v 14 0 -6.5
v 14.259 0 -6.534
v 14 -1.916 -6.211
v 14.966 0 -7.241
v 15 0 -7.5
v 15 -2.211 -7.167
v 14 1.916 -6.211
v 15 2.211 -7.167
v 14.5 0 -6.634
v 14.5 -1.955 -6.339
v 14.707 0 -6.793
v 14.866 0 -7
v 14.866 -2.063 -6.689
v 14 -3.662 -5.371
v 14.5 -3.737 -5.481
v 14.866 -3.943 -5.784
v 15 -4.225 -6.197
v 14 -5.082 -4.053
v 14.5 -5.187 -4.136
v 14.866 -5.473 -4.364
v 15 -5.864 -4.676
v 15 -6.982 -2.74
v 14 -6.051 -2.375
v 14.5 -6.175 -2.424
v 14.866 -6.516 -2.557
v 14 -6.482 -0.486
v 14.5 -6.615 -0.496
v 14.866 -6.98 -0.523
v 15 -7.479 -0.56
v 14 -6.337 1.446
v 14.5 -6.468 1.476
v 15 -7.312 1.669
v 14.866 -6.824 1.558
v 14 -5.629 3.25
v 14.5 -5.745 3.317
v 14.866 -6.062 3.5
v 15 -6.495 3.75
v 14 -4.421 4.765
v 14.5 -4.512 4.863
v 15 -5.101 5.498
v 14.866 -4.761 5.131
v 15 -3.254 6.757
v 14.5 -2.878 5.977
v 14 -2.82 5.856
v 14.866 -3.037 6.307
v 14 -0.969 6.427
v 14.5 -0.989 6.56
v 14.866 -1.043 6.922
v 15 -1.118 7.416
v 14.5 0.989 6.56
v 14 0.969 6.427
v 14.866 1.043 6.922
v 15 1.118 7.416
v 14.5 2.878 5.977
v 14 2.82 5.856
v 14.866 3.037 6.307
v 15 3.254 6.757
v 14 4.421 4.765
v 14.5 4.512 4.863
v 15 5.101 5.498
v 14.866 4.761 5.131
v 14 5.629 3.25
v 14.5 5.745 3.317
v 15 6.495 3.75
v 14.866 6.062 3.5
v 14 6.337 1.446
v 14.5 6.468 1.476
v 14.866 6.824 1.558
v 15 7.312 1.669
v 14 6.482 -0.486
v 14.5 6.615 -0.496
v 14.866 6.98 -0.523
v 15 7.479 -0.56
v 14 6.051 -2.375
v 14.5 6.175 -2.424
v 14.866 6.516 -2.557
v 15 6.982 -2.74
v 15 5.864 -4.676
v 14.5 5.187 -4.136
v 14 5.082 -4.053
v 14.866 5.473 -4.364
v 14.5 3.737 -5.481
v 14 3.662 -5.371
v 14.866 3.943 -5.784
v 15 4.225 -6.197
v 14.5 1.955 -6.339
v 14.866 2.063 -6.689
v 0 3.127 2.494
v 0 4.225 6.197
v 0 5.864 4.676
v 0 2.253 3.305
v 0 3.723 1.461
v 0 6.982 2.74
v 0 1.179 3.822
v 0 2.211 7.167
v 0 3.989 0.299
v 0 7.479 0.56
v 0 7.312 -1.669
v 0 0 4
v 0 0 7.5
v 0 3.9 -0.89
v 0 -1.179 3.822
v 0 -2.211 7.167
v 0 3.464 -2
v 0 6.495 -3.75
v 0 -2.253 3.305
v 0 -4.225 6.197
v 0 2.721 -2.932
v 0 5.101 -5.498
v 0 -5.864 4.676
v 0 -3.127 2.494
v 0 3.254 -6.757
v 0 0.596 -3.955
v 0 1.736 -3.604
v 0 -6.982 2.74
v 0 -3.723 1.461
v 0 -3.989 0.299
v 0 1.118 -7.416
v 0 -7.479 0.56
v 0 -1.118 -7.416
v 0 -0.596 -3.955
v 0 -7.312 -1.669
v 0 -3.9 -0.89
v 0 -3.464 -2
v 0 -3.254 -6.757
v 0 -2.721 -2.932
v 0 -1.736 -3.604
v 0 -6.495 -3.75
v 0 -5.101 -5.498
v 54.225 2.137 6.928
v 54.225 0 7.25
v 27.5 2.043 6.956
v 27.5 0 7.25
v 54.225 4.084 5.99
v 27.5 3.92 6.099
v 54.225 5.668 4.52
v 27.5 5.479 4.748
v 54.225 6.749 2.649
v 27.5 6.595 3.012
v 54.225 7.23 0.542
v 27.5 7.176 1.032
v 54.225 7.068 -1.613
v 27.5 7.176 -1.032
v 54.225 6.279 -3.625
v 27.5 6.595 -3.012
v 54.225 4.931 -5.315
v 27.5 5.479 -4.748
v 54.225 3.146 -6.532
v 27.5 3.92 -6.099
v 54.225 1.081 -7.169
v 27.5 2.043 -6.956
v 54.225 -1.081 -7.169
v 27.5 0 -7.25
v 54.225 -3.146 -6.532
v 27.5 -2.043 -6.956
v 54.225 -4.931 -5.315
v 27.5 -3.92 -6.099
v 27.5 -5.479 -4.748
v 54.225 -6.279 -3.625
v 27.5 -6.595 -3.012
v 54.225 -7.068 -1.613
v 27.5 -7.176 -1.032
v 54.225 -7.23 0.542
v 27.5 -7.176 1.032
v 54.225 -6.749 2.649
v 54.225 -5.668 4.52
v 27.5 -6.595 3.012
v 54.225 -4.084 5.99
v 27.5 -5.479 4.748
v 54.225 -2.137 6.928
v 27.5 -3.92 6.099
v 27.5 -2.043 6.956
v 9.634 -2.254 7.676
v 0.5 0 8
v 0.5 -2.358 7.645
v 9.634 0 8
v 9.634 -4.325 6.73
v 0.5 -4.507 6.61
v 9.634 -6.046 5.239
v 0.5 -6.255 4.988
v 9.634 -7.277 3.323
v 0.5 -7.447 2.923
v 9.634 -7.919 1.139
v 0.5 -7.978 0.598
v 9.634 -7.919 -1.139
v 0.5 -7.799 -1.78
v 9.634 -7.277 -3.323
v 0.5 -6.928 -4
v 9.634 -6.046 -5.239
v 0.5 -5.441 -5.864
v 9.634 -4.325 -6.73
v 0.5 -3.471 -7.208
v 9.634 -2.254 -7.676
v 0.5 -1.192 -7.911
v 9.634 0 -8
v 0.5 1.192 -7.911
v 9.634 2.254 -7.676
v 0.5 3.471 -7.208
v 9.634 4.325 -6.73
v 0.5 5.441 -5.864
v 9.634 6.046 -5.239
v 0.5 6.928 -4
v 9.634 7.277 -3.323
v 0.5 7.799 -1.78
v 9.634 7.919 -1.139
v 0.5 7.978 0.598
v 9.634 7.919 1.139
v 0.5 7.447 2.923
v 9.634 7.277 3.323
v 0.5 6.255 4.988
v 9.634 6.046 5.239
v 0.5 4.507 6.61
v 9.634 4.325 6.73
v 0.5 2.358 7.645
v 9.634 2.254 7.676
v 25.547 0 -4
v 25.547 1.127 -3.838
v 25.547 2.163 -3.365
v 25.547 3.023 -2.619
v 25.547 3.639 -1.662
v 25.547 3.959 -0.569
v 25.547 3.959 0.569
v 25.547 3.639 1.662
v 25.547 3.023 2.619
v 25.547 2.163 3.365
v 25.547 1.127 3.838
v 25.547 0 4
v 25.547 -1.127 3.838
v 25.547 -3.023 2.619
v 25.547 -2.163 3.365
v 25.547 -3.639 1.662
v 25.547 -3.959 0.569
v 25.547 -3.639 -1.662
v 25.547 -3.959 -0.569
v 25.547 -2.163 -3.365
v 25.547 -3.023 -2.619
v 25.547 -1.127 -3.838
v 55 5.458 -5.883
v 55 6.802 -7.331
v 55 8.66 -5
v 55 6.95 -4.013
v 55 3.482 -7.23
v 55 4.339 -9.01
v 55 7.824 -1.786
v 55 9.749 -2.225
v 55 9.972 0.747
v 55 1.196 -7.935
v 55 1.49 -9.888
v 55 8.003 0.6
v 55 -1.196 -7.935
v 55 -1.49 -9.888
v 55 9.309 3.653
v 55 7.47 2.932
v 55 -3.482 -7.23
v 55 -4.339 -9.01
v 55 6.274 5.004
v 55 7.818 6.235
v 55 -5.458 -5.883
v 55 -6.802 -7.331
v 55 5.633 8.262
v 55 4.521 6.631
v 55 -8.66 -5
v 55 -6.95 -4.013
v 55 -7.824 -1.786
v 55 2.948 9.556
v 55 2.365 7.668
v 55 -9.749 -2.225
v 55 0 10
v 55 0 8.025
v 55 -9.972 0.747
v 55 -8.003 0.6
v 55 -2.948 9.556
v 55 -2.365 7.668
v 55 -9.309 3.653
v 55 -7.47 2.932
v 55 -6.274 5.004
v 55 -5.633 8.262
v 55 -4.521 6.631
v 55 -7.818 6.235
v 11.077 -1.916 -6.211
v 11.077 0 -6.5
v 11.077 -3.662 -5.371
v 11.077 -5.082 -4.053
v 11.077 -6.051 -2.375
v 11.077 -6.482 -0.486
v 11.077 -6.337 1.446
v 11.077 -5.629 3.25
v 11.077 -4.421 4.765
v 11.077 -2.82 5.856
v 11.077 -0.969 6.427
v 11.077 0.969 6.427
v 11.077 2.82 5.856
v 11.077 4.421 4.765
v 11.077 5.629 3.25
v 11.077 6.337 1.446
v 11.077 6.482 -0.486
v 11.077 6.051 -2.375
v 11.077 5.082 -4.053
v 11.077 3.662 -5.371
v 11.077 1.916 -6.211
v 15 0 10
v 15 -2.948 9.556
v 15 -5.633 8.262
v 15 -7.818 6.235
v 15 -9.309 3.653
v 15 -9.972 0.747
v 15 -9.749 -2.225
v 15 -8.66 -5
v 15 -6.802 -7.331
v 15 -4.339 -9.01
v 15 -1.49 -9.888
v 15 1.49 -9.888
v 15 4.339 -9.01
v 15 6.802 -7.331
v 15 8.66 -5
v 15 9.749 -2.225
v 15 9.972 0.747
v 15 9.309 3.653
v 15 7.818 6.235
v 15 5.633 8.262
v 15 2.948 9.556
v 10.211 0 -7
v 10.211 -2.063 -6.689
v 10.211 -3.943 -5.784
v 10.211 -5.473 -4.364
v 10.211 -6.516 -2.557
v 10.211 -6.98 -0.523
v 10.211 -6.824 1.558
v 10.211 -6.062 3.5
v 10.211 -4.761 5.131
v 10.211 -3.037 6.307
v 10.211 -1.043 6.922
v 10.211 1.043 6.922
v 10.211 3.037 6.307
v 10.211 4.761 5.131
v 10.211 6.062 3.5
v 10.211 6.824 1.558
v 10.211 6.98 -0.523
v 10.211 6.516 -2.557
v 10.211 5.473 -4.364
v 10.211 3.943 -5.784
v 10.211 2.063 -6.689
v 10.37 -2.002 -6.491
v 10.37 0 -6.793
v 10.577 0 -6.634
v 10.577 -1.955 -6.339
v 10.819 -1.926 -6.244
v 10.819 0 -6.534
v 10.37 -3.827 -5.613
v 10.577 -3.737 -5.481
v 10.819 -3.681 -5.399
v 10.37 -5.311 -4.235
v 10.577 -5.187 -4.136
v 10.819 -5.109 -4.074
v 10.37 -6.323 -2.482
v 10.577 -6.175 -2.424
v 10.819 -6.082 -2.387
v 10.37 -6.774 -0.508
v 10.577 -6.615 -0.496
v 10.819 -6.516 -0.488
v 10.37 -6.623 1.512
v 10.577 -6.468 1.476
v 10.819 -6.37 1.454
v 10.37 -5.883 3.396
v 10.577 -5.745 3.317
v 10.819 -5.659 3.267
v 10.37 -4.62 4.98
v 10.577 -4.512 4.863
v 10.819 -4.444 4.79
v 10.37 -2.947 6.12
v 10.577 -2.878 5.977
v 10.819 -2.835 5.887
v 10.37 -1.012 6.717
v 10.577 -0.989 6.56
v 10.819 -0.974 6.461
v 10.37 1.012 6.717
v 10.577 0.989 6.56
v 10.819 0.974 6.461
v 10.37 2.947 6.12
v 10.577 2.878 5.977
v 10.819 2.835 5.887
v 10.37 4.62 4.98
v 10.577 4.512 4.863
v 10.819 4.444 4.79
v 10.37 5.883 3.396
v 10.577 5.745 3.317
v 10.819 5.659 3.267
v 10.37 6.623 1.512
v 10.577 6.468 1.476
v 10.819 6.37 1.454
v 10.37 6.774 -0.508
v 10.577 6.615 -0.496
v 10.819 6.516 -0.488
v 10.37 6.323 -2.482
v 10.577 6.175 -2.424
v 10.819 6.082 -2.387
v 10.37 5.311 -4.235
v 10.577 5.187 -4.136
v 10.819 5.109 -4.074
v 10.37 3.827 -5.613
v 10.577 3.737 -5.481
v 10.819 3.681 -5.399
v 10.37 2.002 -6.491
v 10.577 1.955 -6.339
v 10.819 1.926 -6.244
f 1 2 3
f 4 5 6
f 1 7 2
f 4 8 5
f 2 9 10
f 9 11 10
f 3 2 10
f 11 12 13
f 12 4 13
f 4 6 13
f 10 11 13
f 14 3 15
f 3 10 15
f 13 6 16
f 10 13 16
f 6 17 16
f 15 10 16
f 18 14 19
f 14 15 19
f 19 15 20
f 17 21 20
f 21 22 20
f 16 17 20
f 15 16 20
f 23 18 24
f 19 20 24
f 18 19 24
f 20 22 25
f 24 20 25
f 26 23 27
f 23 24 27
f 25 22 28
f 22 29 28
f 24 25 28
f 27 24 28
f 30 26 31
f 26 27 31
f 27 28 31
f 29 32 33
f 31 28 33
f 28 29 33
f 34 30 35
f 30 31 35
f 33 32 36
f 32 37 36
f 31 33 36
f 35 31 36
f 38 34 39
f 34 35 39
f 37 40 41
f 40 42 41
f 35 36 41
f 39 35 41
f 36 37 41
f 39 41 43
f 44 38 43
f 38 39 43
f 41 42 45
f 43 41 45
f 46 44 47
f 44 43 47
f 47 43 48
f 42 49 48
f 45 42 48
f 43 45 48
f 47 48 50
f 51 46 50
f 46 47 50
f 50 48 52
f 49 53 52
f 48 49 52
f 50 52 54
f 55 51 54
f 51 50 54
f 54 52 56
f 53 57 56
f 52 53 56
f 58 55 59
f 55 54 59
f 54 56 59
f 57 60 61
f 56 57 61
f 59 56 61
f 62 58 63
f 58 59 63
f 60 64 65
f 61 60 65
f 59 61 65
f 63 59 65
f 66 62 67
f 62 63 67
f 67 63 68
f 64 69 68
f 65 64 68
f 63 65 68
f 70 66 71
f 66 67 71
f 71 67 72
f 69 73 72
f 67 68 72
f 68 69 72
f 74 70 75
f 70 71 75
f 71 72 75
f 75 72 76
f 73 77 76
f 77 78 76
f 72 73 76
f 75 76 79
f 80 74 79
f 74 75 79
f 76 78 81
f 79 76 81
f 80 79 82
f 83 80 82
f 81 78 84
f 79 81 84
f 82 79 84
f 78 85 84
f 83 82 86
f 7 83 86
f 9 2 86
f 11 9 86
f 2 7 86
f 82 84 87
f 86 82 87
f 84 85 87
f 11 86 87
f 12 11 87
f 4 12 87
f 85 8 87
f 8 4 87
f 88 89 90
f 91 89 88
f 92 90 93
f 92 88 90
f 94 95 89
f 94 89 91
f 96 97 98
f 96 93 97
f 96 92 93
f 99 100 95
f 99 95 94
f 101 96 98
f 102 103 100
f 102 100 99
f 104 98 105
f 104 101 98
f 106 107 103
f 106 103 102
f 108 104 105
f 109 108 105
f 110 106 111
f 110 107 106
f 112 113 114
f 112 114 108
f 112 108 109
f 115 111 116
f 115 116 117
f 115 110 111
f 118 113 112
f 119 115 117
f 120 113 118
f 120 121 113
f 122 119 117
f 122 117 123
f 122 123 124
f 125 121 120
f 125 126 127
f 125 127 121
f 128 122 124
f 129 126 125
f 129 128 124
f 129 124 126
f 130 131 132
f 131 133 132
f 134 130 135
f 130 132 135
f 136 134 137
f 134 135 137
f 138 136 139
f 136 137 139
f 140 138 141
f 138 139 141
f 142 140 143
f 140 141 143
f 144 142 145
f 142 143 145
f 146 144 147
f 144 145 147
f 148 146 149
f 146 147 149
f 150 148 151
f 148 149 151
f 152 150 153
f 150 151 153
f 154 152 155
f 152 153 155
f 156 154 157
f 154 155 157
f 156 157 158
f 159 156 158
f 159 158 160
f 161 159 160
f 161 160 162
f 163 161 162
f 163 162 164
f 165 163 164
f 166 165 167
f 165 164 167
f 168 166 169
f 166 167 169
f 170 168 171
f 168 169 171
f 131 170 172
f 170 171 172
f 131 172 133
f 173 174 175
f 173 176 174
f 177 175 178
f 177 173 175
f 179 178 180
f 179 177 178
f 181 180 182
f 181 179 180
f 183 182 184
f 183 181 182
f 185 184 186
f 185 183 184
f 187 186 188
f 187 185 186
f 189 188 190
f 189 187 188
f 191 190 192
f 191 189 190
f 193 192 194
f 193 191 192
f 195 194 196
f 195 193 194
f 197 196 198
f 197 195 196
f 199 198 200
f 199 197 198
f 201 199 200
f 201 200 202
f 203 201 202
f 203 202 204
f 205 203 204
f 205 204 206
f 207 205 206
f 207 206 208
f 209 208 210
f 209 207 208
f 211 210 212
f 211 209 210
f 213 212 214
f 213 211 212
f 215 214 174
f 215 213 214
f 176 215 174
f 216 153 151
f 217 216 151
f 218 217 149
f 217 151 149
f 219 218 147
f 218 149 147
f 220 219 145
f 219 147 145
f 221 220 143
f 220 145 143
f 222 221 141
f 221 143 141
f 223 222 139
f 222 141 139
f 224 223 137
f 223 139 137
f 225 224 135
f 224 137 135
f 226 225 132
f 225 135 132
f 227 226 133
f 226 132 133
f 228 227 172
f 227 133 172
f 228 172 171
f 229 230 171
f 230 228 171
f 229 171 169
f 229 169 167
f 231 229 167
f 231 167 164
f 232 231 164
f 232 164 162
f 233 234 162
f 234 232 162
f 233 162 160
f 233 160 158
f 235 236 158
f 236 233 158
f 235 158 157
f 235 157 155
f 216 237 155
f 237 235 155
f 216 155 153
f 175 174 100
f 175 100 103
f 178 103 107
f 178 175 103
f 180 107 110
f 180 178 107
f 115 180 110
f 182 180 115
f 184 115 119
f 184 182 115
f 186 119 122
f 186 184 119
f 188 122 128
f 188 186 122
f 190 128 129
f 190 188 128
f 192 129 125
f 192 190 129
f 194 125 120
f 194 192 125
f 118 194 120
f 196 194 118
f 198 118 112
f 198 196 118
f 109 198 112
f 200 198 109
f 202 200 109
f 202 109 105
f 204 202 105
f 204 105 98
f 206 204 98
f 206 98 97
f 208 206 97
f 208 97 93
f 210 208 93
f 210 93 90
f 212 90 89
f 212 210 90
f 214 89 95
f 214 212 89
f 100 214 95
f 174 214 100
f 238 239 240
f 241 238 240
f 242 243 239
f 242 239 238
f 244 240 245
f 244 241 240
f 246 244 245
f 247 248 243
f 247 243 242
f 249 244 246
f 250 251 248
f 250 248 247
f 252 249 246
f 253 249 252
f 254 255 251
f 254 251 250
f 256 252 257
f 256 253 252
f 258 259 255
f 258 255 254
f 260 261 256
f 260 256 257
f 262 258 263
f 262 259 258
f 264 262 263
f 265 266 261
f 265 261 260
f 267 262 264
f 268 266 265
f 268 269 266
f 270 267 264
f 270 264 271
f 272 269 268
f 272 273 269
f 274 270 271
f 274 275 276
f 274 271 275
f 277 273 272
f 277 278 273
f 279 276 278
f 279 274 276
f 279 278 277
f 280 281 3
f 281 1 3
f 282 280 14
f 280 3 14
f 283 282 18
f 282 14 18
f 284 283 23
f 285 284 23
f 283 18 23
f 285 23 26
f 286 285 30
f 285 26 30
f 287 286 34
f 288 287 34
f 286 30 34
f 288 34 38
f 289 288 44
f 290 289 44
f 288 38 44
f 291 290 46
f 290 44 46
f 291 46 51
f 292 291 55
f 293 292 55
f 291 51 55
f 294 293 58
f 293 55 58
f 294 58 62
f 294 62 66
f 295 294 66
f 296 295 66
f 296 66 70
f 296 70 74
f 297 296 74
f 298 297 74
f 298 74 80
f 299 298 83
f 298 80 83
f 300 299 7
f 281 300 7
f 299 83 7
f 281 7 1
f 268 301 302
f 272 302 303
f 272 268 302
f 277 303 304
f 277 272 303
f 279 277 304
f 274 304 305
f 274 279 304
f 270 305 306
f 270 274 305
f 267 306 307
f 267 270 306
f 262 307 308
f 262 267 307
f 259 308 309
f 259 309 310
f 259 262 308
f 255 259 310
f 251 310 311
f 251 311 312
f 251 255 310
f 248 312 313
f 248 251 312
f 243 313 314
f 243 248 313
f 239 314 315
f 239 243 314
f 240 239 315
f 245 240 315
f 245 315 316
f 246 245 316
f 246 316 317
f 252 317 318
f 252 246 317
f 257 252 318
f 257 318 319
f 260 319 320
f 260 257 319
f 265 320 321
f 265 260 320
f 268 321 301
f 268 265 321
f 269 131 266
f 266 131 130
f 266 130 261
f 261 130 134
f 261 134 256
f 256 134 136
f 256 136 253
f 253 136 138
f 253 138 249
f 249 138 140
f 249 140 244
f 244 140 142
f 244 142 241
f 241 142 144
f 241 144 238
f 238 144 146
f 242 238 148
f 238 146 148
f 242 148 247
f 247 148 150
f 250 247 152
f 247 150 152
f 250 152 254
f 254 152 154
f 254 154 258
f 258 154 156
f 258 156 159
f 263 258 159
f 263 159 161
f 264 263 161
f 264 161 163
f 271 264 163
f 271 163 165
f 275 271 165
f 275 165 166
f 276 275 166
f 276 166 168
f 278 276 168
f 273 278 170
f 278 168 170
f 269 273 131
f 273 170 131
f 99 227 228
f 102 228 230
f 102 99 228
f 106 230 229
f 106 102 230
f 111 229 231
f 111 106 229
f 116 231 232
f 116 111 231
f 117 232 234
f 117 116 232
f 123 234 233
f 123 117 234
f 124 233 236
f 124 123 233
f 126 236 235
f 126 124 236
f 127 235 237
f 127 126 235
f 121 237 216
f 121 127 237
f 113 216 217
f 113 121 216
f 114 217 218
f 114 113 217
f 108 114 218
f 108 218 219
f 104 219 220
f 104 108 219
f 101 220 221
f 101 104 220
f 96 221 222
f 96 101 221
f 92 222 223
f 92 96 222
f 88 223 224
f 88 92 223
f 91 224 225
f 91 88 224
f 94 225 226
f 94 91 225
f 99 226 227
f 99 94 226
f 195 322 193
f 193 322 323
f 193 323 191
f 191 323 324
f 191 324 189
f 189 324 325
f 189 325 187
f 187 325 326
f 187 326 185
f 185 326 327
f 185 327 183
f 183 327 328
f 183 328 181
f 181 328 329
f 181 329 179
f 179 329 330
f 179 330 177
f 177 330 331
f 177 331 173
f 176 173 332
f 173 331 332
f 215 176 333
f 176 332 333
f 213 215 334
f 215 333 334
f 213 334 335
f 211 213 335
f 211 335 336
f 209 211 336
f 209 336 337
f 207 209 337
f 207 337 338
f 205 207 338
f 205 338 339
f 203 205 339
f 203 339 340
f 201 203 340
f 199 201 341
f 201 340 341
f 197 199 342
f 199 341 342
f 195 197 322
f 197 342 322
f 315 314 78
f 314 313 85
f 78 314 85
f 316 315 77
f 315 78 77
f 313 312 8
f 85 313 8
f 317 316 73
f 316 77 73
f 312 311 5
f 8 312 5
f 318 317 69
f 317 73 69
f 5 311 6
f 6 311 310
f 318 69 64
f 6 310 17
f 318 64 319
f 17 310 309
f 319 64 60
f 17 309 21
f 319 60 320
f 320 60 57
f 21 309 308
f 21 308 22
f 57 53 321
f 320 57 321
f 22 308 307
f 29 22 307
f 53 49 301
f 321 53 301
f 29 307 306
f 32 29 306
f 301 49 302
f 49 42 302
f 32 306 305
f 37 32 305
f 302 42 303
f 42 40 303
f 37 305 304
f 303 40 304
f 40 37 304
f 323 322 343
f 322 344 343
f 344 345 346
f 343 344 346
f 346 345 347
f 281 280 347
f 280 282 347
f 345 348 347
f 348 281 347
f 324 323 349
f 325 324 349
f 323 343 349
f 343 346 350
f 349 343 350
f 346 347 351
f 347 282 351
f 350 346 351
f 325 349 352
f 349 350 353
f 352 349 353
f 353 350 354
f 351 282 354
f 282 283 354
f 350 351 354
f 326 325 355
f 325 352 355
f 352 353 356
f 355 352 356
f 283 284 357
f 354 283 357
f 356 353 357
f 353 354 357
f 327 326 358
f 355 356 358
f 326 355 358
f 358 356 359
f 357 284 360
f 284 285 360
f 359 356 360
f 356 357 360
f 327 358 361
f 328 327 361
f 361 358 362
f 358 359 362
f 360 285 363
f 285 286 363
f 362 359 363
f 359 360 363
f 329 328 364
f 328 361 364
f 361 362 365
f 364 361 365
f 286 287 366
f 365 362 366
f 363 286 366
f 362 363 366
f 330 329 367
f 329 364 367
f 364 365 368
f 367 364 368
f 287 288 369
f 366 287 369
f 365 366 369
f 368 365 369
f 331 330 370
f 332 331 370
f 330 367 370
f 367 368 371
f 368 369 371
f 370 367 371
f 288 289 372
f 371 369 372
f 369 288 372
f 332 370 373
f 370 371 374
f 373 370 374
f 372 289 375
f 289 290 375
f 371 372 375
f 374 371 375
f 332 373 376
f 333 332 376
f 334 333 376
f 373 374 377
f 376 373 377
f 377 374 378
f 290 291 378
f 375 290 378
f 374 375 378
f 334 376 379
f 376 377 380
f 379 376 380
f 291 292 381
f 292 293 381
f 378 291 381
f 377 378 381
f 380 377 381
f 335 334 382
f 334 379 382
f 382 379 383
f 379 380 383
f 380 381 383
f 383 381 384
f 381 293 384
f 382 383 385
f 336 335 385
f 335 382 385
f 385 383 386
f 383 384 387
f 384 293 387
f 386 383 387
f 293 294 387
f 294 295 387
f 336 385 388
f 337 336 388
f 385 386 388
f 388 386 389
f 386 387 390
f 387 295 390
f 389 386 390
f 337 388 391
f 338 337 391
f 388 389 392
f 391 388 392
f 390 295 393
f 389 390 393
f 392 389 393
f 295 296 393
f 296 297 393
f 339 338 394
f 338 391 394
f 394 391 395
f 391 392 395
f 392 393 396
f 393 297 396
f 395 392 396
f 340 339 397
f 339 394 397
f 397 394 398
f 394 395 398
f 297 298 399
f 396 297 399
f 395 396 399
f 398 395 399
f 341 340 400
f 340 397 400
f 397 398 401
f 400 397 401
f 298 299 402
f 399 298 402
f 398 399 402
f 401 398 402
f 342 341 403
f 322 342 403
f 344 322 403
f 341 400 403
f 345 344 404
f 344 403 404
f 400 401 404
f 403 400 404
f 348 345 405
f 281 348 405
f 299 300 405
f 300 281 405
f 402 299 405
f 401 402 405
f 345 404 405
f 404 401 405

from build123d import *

# Parameters (mm, degrees)
M16X1_5_GEWINDEBOHRUNG1_D           = 14.5
M16X1_5_GEWINDEBOHRUNG1_DEPTH       = 27.5
M16X1_5_GEWINDEBOHRUNG1_CSINK_D     = 16.05
M16X1_5_GEWINDEBOHRUNG1_CSINK_ANGLE = 90
M16X1_5_GEWINDEBOHRUNG1_TIP         = 4.356239488
FASE1_SIZE                          = 0.5


with BuildPart() as part:
    # Skizze1 → Rotation1 (revolve)
    with BuildSketch(Plane.XY, mode=Mode.PRIVATE) as rotation1_sk:
        Polygon((55, 4), (0, 4), (0, 8), (15, 8), (15, 10), (55, 10), align=None)
    revolve(rotation1_sk.sketch.rotate(Axis((0, 0, 0), (1, 0, 0)), 90), axis=Axis((0, 0, 0), (1, 0, 0)))

    # M16x1.5 Gewindebohrung1
    with Locations(Plane(origin=(55, 0, 0), x_dir=(0, 0, -1), z_dir=(1, 0, 0))):
        with Locations((0, 0)):
            CounterSinkHole(M16X1_5_GEWINDEBOHRUNG1_D / 2, M16X1_5_GEWINDEBOHRUNG1_CSINK_D / 2, depth=M16X1_5_GEWINDEBOHRUNG1_DEPTH, counter_sink_angle=M16X1_5_GEWINDEBOHRUNG1_CSINK_ANGLE)
            with Locations((0, 0, -(M16X1_5_GEWINDEBOHRUNG1_DEPTH + M16X1_5_GEWINDEBOHRUNG1_TIP / 2))):  # 118° drill point
                Cone(0, M16X1_5_GEWINDEBOHRUNG1_D / 2, M16X1_5_GEWINDEBOHRUNG1_TIP, mode=Mode.SUBTRACT)

    # Fase1
    fase1_edges = [part.edges().sort_by_distance(p)[0] for p in [
        (0, 0, -8),
    ]]
    chamfer(fase1_edges, length=FASE1_SIZE)

    # Skizze31 → Schnitt-Rotation1 (revolve, cut)
    with BuildSketch(Plane(origin=(15, 0, 0), x_dir=(1, 0, 0), z_dir=(0, 0, 1)), mode=Mode.PRIVATE) as schnitt_rotation1_sk:
        with BuildLine():
            Line((-5.366025404, 8), (-4.788675135, 7))
            ThreePointArc((-4.788675135, 7), (-4.422649731, 6.633974596), (-3.922649731, 6.5))
            Line((-3.922649731, 6.5), (-1, 6.5))
            ThreePointArc((-1, 6.5), (-0.292893219, 6.792893219), (0, 7.5))
            Line((0, 7.5), (0, 8))
            Line((0, 8), (-5.366025404, 8))
        make_face()
    revolve(schnitt_rotation1_sk.sketch.rotate(Axis((28.677186203, 0, 0), (-1, 0, 0)), 90), axis=Axis((28.677186203, 0, 0), (-1, 0, 0)), mode=Mode.SUBTRACT)


solid = part.part
